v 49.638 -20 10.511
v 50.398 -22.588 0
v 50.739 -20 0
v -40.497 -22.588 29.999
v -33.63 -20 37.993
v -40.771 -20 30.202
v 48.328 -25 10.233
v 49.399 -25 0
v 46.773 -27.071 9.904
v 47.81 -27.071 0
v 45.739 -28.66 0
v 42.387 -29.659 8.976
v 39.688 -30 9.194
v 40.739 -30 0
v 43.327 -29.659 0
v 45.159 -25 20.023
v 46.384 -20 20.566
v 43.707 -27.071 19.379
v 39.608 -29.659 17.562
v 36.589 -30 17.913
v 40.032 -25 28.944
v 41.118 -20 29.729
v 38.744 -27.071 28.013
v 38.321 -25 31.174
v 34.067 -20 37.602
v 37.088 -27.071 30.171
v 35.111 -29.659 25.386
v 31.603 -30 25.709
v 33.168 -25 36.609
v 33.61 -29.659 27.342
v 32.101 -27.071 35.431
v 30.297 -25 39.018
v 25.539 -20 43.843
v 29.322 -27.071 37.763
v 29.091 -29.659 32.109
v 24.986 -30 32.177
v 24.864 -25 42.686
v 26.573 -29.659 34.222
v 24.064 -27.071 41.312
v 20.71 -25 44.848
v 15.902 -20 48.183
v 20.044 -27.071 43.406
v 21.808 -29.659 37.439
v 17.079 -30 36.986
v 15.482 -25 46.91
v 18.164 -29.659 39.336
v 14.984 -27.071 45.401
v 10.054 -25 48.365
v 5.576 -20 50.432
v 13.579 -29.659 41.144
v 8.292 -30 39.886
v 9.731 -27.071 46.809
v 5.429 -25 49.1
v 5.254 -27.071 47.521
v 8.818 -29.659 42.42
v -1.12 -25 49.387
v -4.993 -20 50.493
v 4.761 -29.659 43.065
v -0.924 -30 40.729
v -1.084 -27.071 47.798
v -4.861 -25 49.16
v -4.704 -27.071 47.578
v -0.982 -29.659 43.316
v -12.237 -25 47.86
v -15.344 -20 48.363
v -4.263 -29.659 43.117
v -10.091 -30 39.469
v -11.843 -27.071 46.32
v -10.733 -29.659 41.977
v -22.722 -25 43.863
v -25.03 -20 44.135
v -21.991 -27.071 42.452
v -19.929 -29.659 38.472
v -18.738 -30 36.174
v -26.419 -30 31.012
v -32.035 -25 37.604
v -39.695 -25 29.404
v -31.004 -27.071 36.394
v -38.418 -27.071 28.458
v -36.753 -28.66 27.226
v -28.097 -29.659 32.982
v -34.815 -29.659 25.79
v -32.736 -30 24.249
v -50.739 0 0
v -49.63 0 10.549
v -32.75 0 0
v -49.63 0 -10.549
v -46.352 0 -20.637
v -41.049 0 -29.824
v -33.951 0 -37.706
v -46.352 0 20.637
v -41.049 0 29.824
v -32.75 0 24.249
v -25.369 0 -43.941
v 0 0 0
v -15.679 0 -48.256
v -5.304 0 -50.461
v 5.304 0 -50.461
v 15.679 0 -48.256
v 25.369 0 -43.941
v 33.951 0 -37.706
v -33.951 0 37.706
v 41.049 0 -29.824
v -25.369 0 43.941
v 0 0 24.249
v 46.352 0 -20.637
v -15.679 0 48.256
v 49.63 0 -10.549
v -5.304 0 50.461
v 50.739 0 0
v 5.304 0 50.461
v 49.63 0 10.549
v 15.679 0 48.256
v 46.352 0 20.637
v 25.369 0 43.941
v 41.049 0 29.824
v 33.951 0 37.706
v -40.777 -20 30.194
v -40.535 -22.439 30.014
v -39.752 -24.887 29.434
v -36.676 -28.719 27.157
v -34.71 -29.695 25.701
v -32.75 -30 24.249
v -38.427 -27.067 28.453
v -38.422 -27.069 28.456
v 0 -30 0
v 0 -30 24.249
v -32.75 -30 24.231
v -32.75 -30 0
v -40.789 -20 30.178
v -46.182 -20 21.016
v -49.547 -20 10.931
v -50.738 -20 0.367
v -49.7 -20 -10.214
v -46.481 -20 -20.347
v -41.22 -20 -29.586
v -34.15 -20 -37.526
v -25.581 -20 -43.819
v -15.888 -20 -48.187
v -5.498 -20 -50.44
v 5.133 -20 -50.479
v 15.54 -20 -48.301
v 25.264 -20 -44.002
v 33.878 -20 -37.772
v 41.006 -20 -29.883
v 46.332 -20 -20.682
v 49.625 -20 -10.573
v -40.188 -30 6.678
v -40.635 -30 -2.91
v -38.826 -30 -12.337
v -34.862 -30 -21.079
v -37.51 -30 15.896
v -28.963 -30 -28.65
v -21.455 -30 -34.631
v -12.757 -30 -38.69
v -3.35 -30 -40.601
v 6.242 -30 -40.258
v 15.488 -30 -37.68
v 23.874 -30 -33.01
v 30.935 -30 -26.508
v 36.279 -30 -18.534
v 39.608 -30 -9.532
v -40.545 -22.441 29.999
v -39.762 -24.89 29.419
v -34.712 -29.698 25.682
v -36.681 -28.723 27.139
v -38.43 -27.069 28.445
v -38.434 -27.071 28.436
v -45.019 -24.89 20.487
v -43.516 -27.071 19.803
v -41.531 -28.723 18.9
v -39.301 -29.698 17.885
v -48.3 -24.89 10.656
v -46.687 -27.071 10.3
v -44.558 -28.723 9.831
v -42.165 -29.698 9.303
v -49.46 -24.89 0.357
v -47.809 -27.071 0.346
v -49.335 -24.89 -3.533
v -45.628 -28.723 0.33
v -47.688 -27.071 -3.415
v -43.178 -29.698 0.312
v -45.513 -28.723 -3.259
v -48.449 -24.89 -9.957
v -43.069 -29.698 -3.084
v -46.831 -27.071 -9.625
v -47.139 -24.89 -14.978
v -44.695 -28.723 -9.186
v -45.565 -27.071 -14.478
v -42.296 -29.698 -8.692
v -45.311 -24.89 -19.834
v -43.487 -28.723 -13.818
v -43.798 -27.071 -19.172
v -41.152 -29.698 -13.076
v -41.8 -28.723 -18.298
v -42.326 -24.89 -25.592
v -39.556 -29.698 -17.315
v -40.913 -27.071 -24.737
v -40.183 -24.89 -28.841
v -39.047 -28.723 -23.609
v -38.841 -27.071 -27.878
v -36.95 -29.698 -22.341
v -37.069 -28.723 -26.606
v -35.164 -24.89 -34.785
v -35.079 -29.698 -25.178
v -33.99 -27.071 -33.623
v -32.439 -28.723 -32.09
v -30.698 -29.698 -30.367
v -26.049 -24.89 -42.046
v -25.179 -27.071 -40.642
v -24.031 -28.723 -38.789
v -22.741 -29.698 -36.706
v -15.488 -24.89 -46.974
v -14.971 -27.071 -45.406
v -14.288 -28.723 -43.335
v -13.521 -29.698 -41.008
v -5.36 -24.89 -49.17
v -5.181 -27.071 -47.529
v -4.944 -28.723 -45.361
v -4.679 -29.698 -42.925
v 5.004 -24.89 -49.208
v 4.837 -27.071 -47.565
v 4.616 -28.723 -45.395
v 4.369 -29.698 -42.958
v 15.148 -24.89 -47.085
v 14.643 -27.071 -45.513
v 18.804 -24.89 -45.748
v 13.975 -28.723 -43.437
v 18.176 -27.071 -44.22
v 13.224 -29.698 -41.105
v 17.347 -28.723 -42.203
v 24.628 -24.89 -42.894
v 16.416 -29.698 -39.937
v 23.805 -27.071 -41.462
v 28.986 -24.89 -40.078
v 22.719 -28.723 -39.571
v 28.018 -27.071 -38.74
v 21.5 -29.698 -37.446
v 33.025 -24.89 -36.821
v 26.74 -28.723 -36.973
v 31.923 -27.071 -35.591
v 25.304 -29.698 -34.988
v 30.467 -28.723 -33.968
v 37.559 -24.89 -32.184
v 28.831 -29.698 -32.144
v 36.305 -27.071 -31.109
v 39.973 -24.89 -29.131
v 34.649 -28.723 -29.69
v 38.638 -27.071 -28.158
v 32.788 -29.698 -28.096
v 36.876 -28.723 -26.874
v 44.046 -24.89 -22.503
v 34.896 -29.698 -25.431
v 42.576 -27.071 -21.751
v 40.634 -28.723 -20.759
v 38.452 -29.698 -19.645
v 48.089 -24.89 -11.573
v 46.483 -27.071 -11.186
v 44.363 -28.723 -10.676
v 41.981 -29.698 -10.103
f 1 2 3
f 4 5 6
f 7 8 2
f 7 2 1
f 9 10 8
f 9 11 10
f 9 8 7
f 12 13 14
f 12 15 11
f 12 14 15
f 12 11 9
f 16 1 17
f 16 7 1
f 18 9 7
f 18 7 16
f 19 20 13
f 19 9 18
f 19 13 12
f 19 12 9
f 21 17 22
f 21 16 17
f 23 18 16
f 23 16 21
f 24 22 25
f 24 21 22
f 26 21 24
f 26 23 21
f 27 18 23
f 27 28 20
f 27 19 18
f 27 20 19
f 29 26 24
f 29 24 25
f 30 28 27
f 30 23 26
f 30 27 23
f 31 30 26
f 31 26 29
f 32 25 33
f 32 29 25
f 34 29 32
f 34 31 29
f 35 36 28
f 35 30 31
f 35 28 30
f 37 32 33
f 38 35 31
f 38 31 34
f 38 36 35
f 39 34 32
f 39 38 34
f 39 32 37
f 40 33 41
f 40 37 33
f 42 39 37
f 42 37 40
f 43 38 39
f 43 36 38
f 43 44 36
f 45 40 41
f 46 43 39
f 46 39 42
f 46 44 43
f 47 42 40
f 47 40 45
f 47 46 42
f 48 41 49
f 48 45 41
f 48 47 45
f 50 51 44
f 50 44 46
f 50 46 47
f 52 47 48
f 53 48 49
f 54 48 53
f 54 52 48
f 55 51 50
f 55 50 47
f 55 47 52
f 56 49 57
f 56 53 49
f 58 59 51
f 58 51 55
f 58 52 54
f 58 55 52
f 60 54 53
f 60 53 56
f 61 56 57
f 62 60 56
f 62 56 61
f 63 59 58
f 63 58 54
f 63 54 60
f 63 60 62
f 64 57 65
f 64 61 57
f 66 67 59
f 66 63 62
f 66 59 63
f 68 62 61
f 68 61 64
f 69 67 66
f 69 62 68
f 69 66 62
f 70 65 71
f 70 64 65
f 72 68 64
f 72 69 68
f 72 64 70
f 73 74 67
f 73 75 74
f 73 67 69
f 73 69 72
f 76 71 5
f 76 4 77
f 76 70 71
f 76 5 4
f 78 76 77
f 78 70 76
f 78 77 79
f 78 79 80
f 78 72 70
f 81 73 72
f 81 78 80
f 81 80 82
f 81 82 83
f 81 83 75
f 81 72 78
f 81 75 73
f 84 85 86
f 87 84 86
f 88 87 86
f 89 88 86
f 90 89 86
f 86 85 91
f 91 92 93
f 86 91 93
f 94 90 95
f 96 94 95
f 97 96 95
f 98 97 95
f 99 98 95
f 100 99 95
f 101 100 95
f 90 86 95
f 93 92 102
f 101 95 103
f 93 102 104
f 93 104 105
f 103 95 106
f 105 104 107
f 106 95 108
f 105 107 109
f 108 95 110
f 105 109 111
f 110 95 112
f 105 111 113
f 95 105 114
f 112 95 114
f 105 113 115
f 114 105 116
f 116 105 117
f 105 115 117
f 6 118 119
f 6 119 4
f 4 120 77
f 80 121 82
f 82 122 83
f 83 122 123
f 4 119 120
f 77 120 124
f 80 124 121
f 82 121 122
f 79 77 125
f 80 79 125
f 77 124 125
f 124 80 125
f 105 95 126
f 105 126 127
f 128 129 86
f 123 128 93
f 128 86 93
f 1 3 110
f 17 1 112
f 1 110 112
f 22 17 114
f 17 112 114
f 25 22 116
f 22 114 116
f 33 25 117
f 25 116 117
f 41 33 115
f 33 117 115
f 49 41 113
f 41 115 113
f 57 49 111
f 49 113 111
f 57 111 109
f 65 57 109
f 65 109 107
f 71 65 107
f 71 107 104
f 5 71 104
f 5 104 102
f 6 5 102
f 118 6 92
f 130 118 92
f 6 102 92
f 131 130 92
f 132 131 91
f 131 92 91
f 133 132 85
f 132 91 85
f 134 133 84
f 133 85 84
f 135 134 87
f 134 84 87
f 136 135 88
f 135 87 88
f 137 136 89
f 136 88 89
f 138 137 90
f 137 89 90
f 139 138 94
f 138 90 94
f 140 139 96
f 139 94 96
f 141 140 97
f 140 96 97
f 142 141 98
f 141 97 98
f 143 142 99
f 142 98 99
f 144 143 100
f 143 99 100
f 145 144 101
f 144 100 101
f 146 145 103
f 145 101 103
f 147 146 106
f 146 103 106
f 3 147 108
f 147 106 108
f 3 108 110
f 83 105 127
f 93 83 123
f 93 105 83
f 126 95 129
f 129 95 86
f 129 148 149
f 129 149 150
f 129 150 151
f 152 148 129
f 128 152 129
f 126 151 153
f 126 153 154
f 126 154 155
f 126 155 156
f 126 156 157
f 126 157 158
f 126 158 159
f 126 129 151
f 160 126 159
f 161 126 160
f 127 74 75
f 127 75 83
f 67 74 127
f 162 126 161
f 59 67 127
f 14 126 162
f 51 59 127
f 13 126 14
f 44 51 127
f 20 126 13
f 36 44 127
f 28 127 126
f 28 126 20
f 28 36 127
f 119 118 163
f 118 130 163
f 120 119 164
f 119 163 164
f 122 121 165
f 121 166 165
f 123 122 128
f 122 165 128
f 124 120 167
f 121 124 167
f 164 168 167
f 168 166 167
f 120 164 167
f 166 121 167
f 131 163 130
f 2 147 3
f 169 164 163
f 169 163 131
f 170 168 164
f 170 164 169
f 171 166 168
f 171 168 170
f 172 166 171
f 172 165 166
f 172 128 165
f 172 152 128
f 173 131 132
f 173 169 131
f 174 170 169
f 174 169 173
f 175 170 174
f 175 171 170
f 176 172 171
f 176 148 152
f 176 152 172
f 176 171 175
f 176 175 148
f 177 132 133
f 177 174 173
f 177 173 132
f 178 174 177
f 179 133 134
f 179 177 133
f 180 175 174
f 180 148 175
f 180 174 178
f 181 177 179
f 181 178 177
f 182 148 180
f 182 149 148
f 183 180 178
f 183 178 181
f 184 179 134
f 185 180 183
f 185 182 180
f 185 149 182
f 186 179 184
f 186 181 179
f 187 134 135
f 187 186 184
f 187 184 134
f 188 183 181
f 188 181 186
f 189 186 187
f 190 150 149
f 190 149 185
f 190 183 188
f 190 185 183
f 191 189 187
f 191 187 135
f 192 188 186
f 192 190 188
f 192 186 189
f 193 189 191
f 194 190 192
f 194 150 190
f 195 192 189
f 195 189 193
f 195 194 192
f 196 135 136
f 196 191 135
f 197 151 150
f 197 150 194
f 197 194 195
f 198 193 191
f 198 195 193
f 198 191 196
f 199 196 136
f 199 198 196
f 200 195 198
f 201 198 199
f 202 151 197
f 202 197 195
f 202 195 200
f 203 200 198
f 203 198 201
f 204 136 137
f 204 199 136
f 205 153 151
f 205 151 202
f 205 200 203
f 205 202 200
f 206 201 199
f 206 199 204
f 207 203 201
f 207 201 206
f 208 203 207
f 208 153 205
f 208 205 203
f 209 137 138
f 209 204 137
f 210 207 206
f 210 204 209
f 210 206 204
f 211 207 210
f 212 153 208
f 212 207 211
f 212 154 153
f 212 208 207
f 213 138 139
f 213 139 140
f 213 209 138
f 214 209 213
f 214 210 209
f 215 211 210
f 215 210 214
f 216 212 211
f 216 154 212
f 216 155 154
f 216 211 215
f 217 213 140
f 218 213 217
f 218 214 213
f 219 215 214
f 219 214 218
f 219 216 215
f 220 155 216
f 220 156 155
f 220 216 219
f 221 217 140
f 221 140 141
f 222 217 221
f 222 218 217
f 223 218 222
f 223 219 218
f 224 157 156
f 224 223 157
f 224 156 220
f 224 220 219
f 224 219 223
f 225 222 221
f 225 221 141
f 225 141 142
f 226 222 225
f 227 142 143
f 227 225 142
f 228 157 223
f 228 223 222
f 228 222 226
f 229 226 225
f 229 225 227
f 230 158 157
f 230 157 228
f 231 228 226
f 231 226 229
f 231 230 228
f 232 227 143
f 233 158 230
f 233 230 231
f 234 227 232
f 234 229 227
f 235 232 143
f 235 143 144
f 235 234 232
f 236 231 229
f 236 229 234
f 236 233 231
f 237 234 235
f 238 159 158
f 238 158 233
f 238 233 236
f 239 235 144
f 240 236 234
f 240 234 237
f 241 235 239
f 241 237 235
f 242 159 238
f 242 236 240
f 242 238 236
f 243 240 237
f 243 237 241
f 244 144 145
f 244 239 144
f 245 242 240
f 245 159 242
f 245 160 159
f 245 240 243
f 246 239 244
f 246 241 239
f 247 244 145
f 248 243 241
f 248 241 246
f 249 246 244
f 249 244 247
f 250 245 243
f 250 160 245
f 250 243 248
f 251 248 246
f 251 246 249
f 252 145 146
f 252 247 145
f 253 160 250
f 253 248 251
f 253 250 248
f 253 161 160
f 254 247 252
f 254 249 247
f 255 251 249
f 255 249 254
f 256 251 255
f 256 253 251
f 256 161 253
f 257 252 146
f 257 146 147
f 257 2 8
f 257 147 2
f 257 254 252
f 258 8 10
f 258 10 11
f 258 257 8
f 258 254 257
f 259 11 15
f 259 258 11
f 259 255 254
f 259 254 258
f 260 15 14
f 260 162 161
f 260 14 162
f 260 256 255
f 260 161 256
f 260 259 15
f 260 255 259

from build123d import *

# Parameters (mm, degrees)
F0_R     = 50.738989
F1_DEPTH = 30
F2_W     = 32.749631
F2_H     = 24.249479
F3_DEPTH = 96.840864
F4_R     = 10


with BuildPart() as f1:
    # F0 (on Front) → F1 (new body)
    with BuildSketch(Plane.XZ):
        Circle(F0_R)
    extrude(amount=F1_DEPTH)

    # F2 (on face) → F3 (cut)
    with BuildSketch(Plane(origin=(0, 0, 0), x_dir=(-1, 0, 0), z_dir=(0, 1, 0))):
        with Locations((16.374816, 12.124739)):
            Rectangle(F2_W, F2_H)
    extrude(amount=-F3_DEPTH, mode=Mode.SUBTRACT)

    # F4
    f4_edges = [f1.edges().sort_by_distance(p)[0] for p in [
        (-50.738989, -30, 0),
    ]]
    fillet(f4_edges, radius=F4_R)


solid = f1.part
